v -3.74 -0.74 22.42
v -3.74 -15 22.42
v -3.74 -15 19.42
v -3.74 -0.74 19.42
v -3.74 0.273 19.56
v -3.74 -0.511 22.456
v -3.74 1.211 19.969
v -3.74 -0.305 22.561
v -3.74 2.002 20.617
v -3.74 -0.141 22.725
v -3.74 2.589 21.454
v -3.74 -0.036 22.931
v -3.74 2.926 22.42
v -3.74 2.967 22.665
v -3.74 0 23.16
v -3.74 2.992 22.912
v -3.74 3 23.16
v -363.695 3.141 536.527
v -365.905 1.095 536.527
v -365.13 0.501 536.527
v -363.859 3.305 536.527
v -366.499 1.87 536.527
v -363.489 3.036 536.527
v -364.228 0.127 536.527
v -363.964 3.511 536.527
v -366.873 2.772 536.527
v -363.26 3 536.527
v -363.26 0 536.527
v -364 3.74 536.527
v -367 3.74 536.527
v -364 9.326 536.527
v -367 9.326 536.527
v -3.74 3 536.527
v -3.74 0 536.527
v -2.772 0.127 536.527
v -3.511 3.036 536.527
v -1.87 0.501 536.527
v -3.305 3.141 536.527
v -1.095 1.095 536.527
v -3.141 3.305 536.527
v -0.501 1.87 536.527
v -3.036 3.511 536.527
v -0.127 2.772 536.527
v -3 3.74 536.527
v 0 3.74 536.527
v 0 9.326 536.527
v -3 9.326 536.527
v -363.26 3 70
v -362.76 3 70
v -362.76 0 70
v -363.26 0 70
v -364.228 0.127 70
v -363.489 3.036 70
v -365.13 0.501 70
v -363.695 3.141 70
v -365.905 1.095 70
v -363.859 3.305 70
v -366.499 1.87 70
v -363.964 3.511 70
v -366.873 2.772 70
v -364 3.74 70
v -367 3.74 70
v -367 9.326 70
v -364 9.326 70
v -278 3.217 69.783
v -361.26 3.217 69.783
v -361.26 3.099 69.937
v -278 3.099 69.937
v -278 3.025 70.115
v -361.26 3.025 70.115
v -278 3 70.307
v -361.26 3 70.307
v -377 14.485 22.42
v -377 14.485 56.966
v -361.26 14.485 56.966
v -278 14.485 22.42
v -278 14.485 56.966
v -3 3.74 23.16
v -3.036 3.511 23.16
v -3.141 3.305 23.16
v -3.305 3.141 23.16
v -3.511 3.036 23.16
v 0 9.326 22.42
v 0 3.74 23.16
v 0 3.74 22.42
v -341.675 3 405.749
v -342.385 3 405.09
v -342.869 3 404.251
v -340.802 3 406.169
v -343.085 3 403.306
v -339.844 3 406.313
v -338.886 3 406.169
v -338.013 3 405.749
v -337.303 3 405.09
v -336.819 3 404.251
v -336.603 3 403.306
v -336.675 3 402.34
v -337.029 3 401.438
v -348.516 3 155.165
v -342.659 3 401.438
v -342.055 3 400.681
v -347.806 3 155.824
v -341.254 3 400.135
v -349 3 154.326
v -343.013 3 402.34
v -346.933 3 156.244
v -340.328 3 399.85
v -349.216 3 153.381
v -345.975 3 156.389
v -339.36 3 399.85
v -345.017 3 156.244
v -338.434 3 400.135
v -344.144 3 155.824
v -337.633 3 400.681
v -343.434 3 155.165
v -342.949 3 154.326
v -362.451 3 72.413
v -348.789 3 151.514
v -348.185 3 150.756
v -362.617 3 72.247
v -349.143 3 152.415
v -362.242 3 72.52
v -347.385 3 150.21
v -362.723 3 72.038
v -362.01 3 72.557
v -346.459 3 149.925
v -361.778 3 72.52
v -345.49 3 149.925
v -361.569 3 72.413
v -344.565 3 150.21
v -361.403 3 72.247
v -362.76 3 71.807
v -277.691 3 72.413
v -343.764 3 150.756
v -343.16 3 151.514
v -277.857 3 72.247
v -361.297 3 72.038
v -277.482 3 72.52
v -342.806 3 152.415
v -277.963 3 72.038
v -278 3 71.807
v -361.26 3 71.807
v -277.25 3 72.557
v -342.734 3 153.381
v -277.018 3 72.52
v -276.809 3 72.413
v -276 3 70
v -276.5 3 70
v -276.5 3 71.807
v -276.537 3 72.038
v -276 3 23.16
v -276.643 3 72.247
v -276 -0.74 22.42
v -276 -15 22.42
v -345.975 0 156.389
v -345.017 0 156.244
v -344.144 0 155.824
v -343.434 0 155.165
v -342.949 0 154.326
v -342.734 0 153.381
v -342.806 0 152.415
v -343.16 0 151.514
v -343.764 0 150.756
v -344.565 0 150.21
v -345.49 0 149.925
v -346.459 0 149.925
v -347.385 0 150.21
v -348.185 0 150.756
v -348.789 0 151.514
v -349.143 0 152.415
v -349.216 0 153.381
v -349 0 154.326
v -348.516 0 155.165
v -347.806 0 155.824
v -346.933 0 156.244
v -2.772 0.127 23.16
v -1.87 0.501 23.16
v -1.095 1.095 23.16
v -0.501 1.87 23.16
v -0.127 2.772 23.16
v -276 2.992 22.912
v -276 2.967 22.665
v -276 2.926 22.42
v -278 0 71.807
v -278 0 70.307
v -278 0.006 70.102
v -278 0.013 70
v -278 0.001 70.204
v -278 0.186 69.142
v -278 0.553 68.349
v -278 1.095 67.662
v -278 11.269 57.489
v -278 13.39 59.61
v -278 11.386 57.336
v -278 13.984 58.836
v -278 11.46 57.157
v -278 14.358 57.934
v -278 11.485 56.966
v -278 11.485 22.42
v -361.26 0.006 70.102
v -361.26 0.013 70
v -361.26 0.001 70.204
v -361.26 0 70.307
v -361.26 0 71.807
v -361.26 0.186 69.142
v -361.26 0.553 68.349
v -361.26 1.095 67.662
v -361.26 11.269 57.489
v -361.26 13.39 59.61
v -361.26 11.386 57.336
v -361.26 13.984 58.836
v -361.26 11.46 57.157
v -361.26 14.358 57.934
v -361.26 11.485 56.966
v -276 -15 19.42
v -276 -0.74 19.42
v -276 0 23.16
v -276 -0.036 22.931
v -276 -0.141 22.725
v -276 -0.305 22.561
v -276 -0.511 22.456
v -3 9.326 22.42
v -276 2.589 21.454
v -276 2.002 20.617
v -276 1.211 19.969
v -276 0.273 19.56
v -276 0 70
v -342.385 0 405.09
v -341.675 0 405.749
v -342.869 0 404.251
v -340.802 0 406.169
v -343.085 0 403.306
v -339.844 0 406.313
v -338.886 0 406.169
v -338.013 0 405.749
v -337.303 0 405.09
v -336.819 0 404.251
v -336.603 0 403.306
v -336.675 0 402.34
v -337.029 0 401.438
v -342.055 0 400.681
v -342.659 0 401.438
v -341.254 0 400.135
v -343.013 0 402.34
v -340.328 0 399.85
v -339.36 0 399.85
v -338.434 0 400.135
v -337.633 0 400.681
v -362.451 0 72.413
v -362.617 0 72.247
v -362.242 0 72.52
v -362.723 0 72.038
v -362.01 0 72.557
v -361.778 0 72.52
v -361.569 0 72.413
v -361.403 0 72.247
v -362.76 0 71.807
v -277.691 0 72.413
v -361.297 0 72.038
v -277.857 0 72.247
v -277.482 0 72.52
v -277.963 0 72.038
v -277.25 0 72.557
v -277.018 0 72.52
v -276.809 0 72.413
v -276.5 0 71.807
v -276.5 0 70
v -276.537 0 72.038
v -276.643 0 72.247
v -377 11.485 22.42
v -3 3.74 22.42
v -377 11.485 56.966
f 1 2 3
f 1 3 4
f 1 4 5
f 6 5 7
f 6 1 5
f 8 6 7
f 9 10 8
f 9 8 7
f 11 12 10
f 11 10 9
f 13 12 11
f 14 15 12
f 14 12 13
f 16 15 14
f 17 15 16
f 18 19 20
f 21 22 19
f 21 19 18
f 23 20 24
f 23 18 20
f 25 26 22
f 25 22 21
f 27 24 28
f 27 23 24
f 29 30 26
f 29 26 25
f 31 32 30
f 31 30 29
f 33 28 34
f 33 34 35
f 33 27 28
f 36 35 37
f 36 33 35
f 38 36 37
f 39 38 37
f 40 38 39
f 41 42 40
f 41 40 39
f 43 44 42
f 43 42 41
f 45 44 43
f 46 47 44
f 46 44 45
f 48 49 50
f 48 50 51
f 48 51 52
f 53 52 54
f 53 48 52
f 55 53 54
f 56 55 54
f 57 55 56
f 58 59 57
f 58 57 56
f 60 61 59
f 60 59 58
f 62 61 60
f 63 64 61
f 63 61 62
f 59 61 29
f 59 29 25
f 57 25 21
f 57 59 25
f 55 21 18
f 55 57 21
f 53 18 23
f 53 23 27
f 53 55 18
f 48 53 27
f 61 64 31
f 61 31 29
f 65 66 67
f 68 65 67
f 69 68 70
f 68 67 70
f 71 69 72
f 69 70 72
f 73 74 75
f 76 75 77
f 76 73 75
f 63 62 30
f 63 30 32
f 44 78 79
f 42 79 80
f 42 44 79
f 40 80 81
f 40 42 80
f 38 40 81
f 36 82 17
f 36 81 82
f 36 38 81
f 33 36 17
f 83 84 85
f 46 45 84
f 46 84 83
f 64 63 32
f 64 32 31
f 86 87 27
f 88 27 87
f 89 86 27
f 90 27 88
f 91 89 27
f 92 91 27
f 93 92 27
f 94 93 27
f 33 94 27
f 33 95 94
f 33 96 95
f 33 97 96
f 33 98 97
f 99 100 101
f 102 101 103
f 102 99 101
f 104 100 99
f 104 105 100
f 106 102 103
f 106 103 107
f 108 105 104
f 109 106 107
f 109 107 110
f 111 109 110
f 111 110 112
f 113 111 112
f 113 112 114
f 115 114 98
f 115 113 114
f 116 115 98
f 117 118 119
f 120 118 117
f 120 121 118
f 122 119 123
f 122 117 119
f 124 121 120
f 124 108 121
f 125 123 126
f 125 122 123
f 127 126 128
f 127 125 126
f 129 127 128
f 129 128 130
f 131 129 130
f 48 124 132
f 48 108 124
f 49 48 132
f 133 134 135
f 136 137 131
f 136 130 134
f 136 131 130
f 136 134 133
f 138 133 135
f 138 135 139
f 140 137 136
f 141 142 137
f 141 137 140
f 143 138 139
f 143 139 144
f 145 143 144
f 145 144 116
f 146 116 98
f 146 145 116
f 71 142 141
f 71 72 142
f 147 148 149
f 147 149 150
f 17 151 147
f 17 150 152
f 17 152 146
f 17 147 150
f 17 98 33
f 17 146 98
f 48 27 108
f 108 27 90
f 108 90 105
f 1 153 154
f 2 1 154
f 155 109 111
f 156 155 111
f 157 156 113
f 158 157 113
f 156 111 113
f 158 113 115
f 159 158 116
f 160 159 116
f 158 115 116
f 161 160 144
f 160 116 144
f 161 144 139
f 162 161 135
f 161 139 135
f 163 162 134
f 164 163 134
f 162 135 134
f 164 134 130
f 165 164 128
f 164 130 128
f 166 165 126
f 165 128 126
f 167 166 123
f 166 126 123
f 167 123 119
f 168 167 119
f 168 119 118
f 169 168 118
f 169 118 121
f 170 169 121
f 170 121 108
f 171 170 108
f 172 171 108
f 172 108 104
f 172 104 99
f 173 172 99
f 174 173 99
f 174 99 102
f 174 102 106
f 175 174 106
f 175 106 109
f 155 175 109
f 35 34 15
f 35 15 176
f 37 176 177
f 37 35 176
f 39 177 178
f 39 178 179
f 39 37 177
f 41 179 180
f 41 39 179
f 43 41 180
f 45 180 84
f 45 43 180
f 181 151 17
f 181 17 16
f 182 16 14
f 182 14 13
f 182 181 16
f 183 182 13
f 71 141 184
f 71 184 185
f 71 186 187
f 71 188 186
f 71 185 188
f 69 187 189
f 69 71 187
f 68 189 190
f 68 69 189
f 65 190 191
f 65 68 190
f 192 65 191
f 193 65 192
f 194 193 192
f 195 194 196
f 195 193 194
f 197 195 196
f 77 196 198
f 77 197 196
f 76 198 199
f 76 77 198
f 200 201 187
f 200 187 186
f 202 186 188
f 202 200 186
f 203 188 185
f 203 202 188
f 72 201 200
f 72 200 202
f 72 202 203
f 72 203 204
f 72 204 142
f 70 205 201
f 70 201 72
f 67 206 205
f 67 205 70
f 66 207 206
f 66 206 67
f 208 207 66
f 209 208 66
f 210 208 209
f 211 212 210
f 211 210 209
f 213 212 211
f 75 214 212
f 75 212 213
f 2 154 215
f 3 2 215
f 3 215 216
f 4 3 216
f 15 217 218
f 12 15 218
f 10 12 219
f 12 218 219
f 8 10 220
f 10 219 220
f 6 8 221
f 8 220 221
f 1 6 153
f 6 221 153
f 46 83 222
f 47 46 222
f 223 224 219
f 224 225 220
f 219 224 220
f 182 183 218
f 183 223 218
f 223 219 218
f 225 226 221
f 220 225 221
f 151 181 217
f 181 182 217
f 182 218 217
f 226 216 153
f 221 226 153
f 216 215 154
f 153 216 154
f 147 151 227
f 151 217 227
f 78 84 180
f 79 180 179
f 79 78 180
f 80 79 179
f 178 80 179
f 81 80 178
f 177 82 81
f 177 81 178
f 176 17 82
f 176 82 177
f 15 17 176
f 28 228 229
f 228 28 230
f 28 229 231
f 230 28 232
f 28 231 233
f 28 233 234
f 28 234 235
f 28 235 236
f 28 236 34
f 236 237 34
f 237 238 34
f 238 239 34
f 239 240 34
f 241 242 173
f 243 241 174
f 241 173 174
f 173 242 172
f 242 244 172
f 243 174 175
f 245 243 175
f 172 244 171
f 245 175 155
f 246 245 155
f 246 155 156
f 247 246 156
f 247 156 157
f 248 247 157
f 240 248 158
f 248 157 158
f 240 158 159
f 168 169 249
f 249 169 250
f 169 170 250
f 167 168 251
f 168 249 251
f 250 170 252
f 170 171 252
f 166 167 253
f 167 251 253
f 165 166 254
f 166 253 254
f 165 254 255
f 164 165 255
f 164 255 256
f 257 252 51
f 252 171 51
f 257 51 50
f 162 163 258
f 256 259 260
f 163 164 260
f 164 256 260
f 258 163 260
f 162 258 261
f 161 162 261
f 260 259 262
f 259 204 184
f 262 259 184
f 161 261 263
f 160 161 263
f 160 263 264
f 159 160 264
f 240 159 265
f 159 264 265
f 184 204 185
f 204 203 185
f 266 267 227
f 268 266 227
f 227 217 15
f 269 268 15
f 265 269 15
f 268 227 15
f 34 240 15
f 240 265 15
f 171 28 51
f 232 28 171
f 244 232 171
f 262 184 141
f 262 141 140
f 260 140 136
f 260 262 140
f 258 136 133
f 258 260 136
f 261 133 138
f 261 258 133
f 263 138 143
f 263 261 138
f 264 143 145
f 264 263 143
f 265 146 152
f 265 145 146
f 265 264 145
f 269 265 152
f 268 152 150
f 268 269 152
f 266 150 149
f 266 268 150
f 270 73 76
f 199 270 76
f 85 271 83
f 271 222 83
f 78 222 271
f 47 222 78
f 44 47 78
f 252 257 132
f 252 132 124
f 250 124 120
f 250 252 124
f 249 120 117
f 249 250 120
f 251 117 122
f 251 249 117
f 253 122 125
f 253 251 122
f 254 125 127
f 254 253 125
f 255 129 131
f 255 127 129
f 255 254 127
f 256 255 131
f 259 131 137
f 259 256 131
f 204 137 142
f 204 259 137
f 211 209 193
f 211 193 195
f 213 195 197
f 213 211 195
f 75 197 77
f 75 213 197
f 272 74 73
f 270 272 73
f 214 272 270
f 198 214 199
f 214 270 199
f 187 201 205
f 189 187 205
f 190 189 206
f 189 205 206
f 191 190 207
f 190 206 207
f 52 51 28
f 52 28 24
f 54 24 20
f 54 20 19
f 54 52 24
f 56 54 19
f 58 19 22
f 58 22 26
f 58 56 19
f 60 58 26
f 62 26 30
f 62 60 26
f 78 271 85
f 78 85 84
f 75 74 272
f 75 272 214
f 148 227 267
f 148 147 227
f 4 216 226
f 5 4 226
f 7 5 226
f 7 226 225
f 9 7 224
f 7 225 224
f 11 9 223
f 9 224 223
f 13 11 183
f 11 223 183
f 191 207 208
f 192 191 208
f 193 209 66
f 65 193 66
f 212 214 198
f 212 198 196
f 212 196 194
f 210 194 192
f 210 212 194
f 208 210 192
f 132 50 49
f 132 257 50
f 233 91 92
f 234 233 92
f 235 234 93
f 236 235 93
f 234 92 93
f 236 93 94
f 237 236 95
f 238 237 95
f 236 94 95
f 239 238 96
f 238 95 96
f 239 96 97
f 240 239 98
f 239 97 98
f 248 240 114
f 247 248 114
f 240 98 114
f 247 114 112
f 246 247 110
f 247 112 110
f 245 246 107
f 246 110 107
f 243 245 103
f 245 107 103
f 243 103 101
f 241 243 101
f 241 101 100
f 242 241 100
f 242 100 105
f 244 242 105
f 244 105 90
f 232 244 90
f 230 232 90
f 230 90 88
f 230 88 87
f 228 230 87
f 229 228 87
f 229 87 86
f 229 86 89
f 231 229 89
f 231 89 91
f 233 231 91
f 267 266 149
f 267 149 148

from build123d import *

# Parameters (mm, degrees)
SM_BASE_FLANGE_1_DEPTH           = 3
SM_EDGE_FLANGE_1_STRIP_W         = 13.48
SM_EDGE_FLANGE_1_STRIP_H         = 3
SM_EDGE_FLANGE_1_STRIP_CUT_DEPTH = 466.526743508
SM_EDGE_FLANGE_1_DEPTH           = 466.526743508
SM_EDGE_FLANGE_2_STRIP_W         = 13.48
SM_EDGE_FLANGE_2_STRIP_H         = 3
SM_EDGE_FLANGE_2_STRIP_CUT_DEPTH = 514.106826818
SM_EDGE_FLANGE_2_DEPTH           = 514.106826818
SM_START                         = -362.76
SM_EDGE_FLANGE_5_DEPTH           = 86.26
SM_START_2                       = -361.26
SM_EDGE_FLANGE_5_2_DEPTH         = 83.26
SM_START_3                       = -1
SM_EDGE_FLANGE_5_3_DEPTH         = 4.216740982
SM_EDGE_FLANGE_6_STRIP_CUT_DEPTH = 83.26
SM_EDGE_FLANGE_6_DEPTH           = 83.26
SM_START_4                       = 3
SM_EDGE_FLANGE_6_PROFILE_W       = 99
SM_EDGE_FLANGE_6_PROFILE_H       = 34.545643213
SM_EDGE_FLANGE_6_FLAT_DEPTH      = 3
SM_START_5                       = -3.74
SM_EDGE_FLANGE_7_DEPTH           = 4.74
SM_START_6                       = -276
SM_EDGE_FLANGE_7_2_DEPTH         = 272.26
SM_EDGE_FLANGE_7_3_DEPTH         = 272.26
SKETCH_29_R                      = 3.25
CUT_EXTRUDE_1_DEPTH              = 5


with BuildPart() as part:
    # Базовая кромка1: sheet metal written as solids
    # Sketch 1 → Базовая кромка1 (new body)
    with BuildSketch(Plane(origin=(0, 0, 0), x_dir=(1, 0, 0), z_dir=(0, 1, 0))):
        Polygon((-367, -536.526743508), (0, -536.526743508), (0, -22.41991669), (-276, -22.41991669), (-276, -70), (-367, -70), align=None)
    extrude(amount=SM_BASE_FLANGE_1_DEPTH)

    # Ребро-кромка1: sheet metal written as solids
    # Ребро-кромка1 strip (on a plane across the edge) → Ребро-кромка1 strip cut (cut)
    with BuildSketch(Plane(origin=(-367, 3, 70), x_dir=(1, 0, 0), z_dir=(0, 0, 1))):
        with Locations((-3, -1.5)):
            Rectangle(SM_EDGE_FLANGE_1_STRIP_W, SM_EDGE_FLANGE_1_STRIP_H)
    extrude(amount=SM_EDGE_FLANGE_1_STRIP_CUT_DEPTH, mode=Mode.SUBTRACT)

    # Ребро-кромка1 section (on a plane across the edge) → Ребро-кромка1 (add)
    with BuildSketch(Plane(origin=(-367, 3, 70), x_dir=(1, 0, 0), z_dir=(0, 0, 1))):
        with BuildLine():
            Line((0, 0.74), (0, 6.325908943))
            Line((0, 6.325908943), (3, 6.325908943))
            Line((3, 6.325908943), (3, 0.74))
            ThreePointArc((3, 0.74), (3.216740982, 0.216740982), (3.74, 0))
            Line((3.74, 0), (3.74, -3))
            ThreePointArc((3.74, -3), (1.095420638, -1.904579362), (0, 0.74))
        make_face()
    extrude(amount=SM_EDGE_FLANGE_1_DEPTH)

    # Ребро-кромка2: sheet metal written as solids
    # Ребро-кромка2 strip (on a plane across the edge) → Ребро-кромка2 strip cut (cut)
    with BuildSketch(Plane(origin=(0, 3, 536.526743508), x_dir=(-1, 0, 0), z_dir=(0, 0, -1))):
        with Locations((-3, -1.5)):
            Rectangle(SM_EDGE_FLANGE_2_STRIP_W, SM_EDGE_FLANGE_2_STRIP_H)
    extrude(amount=SM_EDGE_FLANGE_2_STRIP_CUT_DEPTH, mode=Mode.SUBTRACT)

    # Ребро-кромка2 section (on a plane across the edge) → Ребро-кромка2 (add)
    with BuildSketch(Plane(origin=(0, 3, 536.526743508), x_dir=(-1, 0, 0), z_dir=(0, 0, -1))):
        with BuildLine():
            Line((0, 0.74), (0, 6.325908943))
            Line((0, 6.325908943), (3, 6.325908943))
            Line((3, 6.325908943), (3, 0.74))
            ThreePointArc((3, 0.74), (3.216740982, 0.216740982), (3.74, 0))
            Line((3.74, 0), (3.74, -3))
            ThreePointArc((3.74, -3), (1.095420638, -1.904579362), (0, 0.74))
        make_face()
    extrude(amount=SM_EDGE_FLANGE_2_DEPTH)

    # Ребро-кромка5: read off the stored shape, not the designer's step
    # Ребро-кромка5 outline → Ребро-кромка5 (cut)
    with BuildSketch(Plane.YZ.offset(SM_START)):
        with BuildLine():
            Line((0, 70), (0.012581766, 70))
            ThreePointArc((0.012581766, 70), (0.003146765, 70.15312996), (0, 70.306518036))
            Line((0, 70.306518036), (0, 70))
        make_face()
    extrude(amount=SM_EDGE_FLANGE_5_DEPTH, mode=Mode.SUBTRACT)

    # Sm Edge Flange 5 2 outline → Sm Edge Flange 5 2 (add)
    with BuildSketch(Plane.YZ.offset(SM_START_2)):
        with BuildLine():
            ThreePointArc((0.012581766, 70), (0.346296855, 68.73477411), (1.095420638, 67.661938675))
            Line((1.095420638, 67.661938675), (11.485281374, 57.272077939))
            Line((11.485281374, 57.272077939), (13.606601718, 59.393398282))
            Line((13.606601718, 59.393398282), (3.216740982, 69.783259018))
            ThreePointArc((3.216740982, 69.783259018), (3.056329146, 70.023332296), (3, 70.306518036))
            Line((3, 70.306518036), (3, 70))
            Line((3, 70), (0.012581766, 70))
        make_face()
    extrude(amount=SM_EDGE_FLANGE_5_2_DEPTH)

    # Sm Edge Flange 5 3 outline → Sm Edge Flange 5 3 (cut)
    with BuildSketch(Plane(origin=(0, 0, 0), x_dir=(1, 0, 0), z_dir=(0, 1, 0)).offset(SM_START_3)):
        with BuildLine():
            ThreePointArc((-362.76, -71.806518036), (-362.01, -72.556518036), (-361.26, -71.806518036))
            Line((-361.26, -71.806518036), (-361.26, -70))
            Line((-361.26, -70), (-362.76, -70))
            Line((-362.76, -70), (-362.76, -71.806518036))
        make_face()
        with BuildLine():
            Line((-278, -70), (-278, -71.806518036))
            ThreePointArc((-278, -71.806518036), (-277.25, -72.556518036), (-276.5, -71.806518036))
            Line((-276.5, -71.806518036), (-276.5, -70))
            Line((-276.5, -70), (-278, -70))
        make_face()
    extrude(amount=SM_EDGE_FLANGE_5_3_DEPTH, mode=Mode.SUBTRACT)

    # Ребро-кромка6: sheet metal written as solids
    # Ребро-кромка6 strip (on a plane across the edge) → Ребро-кромка6 strip cut (cut)
    with BuildSketch(Plane(origin=(-361.26, 11.485281374, 57.272077939), x_dir=(0, -1, 0), z_dir=(1, 0, 0))):
        Polygon((-11.436378772, 7.193738085), (-1.904579362, -2.338061325), (0.216740982, -0.216740982), (-9.315058428, 9.315058428), align=None)
    extrude(amount=SM_EDGE_FLANGE_6_STRIP_CUT_DEPTH, mode=Mode.SUBTRACT)

    # Ребро-кромка6 bend section (on a plane across the edge) → Ребро-кромка6 (add)
    with BuildSketch(Plane(origin=(-361.26, 11.485281374, 57.272077939), x_dir=(0, -1, 0), z_dir=(1, 0, 0))):
        with BuildLine():
            Line((-3, 0.306518036), (0, 0.306518036))
            ThreePointArc((0, 0.306518036), (0.056329146, 0.023332296), (0.216740982, -0.216740982))
            Line((0.216740982, -0.216740982), (-1.904579362, -2.338061325))
            ThreePointArc((-1.904579362, -2.338061325), (-2.715309452, -1.124718001), (-3, 0.306518036))
        make_face()
    extrude(amount=SM_EDGE_FLANGE_6_DEPTH)

    # Ребро-кромка6 profile (on flange) → Ребро-кромка6 flat (add)
    with BuildSketch(Plane(origin=(0, 11.485281374, 57.272077939), x_dir=(1, 0, 0), z_dir=(0, 1, 0)).offset(SM_START_4)):
        with Locations((-327.5, 17.579339643)):
            Rectangle(SM_EDGE_FLANGE_6_PROFILE_W, SM_EDGE_FLANGE_6_PROFILE_H)
    extrude(amount=-SM_EDGE_FLANGE_6_FLAT_DEPTH)

    # Ребро-кромка7: read off the stored shape, not the designer's step
    # Ребро-кромка7 outline → Ребро-кромка7 (cut)
    with BuildSketch(Plane.YZ.offset(SM_START_5)):
        with BuildLine():
            Line((3.74, 22.41991669), (3.74, 23.15991669))
            Line((3.74, 23.15991669), (0, 23.15991669))
            ThreePointArc((0, 23.15991669), (-0.216740982, 22.636657672), (-0.74, 22.41991669))
            Line((-0.74, 22.41991669), (-15, 22.41991669))
            Line((-15, 22.41991669), (-15, 19.41991669))
            Line((-15, 19.41991669), (-0.74, 19.41991669))
            ThreePointArc((-0.74, 19.41991669), (1.628543857, 20.265508287), (2.926060556, 22.41991669))
            Line((2.926060556, 22.41991669), (3.74, 22.41991669))
        make_face()
    extrude(amount=SM_EDGE_FLANGE_7_DEPTH, mode=Mode.SUBTRACT)

    # Sm Edge Flange 7 2 outline → Sm Edge Flange 7 2 (cut)
    with BuildSketch(Plane.YZ.offset(SM_START_6)):
        with BuildLine():
            Line((2.926060556, 22.41991669), (3.74, 22.41991669))
            Line((3.74, 22.41991669), (3.74, 23.15991669))
            Line((3.74, 23.15991669), (3, 23.15991669))
            ThreePointArc((3, 23.15991669), (2.981469231, 22.788074304), (2.926060556, 22.41991669))
        make_face()
    extrude(amount=SM_EDGE_FLANGE_7_2_DEPTH, mode=Mode.SUBTRACT)

    # Sm Edge Flange 7 3 outline → Sm Edge Flange 7 3 (add)
    with BuildSketch(Plane.YZ.offset(SM_START_6)):
        with BuildLine():
            ThreePointArc((2.926060556, 22.41991669), (2.981469231, 22.788074304), (3, 23.15991669))
            Line((3, 23.15991669), (0, 23.15991669))
            ThreePointArc((0, 23.15991669), (-0.216740982, 22.636657672), (-0.74, 22.41991669))
            Line((-0.74, 22.41991669), (-15, 22.41991669))
            Line((-15, 22.41991669), (-15, 19.41991669))
            Line((-15, 19.41991669), (-0.74, 19.41991669))
            ThreePointArc((-0.74, 19.41991669), (1.628543857, 20.265508287), (2.926060556, 22.41991669))
        make_face()
    extrude(amount=SM_EDGE_FLANGE_7_3_DEPTH)

    # Эскиз29 → Вырез-Вытянуть1 (cut)
    with BuildSketch(Plane(origin=(0, 3, 0), x_dir=(1, 0, 0), z_dir=(0, 1, 0))):
        with Locations(Location((-345.974710107, -153.138626068, 0), (0, 0, 270))):
            Circle(SKETCH_29_R)
        with Locations(Location((-339.843991697, -403.063443347, 0), (0, 0, 270))):
            Circle(SKETCH_29_R)
    extrude(amount=-CUT_EXTRUDE_1_DEPTH, mode=Mode.SUBTRACT)


solid = part.part
